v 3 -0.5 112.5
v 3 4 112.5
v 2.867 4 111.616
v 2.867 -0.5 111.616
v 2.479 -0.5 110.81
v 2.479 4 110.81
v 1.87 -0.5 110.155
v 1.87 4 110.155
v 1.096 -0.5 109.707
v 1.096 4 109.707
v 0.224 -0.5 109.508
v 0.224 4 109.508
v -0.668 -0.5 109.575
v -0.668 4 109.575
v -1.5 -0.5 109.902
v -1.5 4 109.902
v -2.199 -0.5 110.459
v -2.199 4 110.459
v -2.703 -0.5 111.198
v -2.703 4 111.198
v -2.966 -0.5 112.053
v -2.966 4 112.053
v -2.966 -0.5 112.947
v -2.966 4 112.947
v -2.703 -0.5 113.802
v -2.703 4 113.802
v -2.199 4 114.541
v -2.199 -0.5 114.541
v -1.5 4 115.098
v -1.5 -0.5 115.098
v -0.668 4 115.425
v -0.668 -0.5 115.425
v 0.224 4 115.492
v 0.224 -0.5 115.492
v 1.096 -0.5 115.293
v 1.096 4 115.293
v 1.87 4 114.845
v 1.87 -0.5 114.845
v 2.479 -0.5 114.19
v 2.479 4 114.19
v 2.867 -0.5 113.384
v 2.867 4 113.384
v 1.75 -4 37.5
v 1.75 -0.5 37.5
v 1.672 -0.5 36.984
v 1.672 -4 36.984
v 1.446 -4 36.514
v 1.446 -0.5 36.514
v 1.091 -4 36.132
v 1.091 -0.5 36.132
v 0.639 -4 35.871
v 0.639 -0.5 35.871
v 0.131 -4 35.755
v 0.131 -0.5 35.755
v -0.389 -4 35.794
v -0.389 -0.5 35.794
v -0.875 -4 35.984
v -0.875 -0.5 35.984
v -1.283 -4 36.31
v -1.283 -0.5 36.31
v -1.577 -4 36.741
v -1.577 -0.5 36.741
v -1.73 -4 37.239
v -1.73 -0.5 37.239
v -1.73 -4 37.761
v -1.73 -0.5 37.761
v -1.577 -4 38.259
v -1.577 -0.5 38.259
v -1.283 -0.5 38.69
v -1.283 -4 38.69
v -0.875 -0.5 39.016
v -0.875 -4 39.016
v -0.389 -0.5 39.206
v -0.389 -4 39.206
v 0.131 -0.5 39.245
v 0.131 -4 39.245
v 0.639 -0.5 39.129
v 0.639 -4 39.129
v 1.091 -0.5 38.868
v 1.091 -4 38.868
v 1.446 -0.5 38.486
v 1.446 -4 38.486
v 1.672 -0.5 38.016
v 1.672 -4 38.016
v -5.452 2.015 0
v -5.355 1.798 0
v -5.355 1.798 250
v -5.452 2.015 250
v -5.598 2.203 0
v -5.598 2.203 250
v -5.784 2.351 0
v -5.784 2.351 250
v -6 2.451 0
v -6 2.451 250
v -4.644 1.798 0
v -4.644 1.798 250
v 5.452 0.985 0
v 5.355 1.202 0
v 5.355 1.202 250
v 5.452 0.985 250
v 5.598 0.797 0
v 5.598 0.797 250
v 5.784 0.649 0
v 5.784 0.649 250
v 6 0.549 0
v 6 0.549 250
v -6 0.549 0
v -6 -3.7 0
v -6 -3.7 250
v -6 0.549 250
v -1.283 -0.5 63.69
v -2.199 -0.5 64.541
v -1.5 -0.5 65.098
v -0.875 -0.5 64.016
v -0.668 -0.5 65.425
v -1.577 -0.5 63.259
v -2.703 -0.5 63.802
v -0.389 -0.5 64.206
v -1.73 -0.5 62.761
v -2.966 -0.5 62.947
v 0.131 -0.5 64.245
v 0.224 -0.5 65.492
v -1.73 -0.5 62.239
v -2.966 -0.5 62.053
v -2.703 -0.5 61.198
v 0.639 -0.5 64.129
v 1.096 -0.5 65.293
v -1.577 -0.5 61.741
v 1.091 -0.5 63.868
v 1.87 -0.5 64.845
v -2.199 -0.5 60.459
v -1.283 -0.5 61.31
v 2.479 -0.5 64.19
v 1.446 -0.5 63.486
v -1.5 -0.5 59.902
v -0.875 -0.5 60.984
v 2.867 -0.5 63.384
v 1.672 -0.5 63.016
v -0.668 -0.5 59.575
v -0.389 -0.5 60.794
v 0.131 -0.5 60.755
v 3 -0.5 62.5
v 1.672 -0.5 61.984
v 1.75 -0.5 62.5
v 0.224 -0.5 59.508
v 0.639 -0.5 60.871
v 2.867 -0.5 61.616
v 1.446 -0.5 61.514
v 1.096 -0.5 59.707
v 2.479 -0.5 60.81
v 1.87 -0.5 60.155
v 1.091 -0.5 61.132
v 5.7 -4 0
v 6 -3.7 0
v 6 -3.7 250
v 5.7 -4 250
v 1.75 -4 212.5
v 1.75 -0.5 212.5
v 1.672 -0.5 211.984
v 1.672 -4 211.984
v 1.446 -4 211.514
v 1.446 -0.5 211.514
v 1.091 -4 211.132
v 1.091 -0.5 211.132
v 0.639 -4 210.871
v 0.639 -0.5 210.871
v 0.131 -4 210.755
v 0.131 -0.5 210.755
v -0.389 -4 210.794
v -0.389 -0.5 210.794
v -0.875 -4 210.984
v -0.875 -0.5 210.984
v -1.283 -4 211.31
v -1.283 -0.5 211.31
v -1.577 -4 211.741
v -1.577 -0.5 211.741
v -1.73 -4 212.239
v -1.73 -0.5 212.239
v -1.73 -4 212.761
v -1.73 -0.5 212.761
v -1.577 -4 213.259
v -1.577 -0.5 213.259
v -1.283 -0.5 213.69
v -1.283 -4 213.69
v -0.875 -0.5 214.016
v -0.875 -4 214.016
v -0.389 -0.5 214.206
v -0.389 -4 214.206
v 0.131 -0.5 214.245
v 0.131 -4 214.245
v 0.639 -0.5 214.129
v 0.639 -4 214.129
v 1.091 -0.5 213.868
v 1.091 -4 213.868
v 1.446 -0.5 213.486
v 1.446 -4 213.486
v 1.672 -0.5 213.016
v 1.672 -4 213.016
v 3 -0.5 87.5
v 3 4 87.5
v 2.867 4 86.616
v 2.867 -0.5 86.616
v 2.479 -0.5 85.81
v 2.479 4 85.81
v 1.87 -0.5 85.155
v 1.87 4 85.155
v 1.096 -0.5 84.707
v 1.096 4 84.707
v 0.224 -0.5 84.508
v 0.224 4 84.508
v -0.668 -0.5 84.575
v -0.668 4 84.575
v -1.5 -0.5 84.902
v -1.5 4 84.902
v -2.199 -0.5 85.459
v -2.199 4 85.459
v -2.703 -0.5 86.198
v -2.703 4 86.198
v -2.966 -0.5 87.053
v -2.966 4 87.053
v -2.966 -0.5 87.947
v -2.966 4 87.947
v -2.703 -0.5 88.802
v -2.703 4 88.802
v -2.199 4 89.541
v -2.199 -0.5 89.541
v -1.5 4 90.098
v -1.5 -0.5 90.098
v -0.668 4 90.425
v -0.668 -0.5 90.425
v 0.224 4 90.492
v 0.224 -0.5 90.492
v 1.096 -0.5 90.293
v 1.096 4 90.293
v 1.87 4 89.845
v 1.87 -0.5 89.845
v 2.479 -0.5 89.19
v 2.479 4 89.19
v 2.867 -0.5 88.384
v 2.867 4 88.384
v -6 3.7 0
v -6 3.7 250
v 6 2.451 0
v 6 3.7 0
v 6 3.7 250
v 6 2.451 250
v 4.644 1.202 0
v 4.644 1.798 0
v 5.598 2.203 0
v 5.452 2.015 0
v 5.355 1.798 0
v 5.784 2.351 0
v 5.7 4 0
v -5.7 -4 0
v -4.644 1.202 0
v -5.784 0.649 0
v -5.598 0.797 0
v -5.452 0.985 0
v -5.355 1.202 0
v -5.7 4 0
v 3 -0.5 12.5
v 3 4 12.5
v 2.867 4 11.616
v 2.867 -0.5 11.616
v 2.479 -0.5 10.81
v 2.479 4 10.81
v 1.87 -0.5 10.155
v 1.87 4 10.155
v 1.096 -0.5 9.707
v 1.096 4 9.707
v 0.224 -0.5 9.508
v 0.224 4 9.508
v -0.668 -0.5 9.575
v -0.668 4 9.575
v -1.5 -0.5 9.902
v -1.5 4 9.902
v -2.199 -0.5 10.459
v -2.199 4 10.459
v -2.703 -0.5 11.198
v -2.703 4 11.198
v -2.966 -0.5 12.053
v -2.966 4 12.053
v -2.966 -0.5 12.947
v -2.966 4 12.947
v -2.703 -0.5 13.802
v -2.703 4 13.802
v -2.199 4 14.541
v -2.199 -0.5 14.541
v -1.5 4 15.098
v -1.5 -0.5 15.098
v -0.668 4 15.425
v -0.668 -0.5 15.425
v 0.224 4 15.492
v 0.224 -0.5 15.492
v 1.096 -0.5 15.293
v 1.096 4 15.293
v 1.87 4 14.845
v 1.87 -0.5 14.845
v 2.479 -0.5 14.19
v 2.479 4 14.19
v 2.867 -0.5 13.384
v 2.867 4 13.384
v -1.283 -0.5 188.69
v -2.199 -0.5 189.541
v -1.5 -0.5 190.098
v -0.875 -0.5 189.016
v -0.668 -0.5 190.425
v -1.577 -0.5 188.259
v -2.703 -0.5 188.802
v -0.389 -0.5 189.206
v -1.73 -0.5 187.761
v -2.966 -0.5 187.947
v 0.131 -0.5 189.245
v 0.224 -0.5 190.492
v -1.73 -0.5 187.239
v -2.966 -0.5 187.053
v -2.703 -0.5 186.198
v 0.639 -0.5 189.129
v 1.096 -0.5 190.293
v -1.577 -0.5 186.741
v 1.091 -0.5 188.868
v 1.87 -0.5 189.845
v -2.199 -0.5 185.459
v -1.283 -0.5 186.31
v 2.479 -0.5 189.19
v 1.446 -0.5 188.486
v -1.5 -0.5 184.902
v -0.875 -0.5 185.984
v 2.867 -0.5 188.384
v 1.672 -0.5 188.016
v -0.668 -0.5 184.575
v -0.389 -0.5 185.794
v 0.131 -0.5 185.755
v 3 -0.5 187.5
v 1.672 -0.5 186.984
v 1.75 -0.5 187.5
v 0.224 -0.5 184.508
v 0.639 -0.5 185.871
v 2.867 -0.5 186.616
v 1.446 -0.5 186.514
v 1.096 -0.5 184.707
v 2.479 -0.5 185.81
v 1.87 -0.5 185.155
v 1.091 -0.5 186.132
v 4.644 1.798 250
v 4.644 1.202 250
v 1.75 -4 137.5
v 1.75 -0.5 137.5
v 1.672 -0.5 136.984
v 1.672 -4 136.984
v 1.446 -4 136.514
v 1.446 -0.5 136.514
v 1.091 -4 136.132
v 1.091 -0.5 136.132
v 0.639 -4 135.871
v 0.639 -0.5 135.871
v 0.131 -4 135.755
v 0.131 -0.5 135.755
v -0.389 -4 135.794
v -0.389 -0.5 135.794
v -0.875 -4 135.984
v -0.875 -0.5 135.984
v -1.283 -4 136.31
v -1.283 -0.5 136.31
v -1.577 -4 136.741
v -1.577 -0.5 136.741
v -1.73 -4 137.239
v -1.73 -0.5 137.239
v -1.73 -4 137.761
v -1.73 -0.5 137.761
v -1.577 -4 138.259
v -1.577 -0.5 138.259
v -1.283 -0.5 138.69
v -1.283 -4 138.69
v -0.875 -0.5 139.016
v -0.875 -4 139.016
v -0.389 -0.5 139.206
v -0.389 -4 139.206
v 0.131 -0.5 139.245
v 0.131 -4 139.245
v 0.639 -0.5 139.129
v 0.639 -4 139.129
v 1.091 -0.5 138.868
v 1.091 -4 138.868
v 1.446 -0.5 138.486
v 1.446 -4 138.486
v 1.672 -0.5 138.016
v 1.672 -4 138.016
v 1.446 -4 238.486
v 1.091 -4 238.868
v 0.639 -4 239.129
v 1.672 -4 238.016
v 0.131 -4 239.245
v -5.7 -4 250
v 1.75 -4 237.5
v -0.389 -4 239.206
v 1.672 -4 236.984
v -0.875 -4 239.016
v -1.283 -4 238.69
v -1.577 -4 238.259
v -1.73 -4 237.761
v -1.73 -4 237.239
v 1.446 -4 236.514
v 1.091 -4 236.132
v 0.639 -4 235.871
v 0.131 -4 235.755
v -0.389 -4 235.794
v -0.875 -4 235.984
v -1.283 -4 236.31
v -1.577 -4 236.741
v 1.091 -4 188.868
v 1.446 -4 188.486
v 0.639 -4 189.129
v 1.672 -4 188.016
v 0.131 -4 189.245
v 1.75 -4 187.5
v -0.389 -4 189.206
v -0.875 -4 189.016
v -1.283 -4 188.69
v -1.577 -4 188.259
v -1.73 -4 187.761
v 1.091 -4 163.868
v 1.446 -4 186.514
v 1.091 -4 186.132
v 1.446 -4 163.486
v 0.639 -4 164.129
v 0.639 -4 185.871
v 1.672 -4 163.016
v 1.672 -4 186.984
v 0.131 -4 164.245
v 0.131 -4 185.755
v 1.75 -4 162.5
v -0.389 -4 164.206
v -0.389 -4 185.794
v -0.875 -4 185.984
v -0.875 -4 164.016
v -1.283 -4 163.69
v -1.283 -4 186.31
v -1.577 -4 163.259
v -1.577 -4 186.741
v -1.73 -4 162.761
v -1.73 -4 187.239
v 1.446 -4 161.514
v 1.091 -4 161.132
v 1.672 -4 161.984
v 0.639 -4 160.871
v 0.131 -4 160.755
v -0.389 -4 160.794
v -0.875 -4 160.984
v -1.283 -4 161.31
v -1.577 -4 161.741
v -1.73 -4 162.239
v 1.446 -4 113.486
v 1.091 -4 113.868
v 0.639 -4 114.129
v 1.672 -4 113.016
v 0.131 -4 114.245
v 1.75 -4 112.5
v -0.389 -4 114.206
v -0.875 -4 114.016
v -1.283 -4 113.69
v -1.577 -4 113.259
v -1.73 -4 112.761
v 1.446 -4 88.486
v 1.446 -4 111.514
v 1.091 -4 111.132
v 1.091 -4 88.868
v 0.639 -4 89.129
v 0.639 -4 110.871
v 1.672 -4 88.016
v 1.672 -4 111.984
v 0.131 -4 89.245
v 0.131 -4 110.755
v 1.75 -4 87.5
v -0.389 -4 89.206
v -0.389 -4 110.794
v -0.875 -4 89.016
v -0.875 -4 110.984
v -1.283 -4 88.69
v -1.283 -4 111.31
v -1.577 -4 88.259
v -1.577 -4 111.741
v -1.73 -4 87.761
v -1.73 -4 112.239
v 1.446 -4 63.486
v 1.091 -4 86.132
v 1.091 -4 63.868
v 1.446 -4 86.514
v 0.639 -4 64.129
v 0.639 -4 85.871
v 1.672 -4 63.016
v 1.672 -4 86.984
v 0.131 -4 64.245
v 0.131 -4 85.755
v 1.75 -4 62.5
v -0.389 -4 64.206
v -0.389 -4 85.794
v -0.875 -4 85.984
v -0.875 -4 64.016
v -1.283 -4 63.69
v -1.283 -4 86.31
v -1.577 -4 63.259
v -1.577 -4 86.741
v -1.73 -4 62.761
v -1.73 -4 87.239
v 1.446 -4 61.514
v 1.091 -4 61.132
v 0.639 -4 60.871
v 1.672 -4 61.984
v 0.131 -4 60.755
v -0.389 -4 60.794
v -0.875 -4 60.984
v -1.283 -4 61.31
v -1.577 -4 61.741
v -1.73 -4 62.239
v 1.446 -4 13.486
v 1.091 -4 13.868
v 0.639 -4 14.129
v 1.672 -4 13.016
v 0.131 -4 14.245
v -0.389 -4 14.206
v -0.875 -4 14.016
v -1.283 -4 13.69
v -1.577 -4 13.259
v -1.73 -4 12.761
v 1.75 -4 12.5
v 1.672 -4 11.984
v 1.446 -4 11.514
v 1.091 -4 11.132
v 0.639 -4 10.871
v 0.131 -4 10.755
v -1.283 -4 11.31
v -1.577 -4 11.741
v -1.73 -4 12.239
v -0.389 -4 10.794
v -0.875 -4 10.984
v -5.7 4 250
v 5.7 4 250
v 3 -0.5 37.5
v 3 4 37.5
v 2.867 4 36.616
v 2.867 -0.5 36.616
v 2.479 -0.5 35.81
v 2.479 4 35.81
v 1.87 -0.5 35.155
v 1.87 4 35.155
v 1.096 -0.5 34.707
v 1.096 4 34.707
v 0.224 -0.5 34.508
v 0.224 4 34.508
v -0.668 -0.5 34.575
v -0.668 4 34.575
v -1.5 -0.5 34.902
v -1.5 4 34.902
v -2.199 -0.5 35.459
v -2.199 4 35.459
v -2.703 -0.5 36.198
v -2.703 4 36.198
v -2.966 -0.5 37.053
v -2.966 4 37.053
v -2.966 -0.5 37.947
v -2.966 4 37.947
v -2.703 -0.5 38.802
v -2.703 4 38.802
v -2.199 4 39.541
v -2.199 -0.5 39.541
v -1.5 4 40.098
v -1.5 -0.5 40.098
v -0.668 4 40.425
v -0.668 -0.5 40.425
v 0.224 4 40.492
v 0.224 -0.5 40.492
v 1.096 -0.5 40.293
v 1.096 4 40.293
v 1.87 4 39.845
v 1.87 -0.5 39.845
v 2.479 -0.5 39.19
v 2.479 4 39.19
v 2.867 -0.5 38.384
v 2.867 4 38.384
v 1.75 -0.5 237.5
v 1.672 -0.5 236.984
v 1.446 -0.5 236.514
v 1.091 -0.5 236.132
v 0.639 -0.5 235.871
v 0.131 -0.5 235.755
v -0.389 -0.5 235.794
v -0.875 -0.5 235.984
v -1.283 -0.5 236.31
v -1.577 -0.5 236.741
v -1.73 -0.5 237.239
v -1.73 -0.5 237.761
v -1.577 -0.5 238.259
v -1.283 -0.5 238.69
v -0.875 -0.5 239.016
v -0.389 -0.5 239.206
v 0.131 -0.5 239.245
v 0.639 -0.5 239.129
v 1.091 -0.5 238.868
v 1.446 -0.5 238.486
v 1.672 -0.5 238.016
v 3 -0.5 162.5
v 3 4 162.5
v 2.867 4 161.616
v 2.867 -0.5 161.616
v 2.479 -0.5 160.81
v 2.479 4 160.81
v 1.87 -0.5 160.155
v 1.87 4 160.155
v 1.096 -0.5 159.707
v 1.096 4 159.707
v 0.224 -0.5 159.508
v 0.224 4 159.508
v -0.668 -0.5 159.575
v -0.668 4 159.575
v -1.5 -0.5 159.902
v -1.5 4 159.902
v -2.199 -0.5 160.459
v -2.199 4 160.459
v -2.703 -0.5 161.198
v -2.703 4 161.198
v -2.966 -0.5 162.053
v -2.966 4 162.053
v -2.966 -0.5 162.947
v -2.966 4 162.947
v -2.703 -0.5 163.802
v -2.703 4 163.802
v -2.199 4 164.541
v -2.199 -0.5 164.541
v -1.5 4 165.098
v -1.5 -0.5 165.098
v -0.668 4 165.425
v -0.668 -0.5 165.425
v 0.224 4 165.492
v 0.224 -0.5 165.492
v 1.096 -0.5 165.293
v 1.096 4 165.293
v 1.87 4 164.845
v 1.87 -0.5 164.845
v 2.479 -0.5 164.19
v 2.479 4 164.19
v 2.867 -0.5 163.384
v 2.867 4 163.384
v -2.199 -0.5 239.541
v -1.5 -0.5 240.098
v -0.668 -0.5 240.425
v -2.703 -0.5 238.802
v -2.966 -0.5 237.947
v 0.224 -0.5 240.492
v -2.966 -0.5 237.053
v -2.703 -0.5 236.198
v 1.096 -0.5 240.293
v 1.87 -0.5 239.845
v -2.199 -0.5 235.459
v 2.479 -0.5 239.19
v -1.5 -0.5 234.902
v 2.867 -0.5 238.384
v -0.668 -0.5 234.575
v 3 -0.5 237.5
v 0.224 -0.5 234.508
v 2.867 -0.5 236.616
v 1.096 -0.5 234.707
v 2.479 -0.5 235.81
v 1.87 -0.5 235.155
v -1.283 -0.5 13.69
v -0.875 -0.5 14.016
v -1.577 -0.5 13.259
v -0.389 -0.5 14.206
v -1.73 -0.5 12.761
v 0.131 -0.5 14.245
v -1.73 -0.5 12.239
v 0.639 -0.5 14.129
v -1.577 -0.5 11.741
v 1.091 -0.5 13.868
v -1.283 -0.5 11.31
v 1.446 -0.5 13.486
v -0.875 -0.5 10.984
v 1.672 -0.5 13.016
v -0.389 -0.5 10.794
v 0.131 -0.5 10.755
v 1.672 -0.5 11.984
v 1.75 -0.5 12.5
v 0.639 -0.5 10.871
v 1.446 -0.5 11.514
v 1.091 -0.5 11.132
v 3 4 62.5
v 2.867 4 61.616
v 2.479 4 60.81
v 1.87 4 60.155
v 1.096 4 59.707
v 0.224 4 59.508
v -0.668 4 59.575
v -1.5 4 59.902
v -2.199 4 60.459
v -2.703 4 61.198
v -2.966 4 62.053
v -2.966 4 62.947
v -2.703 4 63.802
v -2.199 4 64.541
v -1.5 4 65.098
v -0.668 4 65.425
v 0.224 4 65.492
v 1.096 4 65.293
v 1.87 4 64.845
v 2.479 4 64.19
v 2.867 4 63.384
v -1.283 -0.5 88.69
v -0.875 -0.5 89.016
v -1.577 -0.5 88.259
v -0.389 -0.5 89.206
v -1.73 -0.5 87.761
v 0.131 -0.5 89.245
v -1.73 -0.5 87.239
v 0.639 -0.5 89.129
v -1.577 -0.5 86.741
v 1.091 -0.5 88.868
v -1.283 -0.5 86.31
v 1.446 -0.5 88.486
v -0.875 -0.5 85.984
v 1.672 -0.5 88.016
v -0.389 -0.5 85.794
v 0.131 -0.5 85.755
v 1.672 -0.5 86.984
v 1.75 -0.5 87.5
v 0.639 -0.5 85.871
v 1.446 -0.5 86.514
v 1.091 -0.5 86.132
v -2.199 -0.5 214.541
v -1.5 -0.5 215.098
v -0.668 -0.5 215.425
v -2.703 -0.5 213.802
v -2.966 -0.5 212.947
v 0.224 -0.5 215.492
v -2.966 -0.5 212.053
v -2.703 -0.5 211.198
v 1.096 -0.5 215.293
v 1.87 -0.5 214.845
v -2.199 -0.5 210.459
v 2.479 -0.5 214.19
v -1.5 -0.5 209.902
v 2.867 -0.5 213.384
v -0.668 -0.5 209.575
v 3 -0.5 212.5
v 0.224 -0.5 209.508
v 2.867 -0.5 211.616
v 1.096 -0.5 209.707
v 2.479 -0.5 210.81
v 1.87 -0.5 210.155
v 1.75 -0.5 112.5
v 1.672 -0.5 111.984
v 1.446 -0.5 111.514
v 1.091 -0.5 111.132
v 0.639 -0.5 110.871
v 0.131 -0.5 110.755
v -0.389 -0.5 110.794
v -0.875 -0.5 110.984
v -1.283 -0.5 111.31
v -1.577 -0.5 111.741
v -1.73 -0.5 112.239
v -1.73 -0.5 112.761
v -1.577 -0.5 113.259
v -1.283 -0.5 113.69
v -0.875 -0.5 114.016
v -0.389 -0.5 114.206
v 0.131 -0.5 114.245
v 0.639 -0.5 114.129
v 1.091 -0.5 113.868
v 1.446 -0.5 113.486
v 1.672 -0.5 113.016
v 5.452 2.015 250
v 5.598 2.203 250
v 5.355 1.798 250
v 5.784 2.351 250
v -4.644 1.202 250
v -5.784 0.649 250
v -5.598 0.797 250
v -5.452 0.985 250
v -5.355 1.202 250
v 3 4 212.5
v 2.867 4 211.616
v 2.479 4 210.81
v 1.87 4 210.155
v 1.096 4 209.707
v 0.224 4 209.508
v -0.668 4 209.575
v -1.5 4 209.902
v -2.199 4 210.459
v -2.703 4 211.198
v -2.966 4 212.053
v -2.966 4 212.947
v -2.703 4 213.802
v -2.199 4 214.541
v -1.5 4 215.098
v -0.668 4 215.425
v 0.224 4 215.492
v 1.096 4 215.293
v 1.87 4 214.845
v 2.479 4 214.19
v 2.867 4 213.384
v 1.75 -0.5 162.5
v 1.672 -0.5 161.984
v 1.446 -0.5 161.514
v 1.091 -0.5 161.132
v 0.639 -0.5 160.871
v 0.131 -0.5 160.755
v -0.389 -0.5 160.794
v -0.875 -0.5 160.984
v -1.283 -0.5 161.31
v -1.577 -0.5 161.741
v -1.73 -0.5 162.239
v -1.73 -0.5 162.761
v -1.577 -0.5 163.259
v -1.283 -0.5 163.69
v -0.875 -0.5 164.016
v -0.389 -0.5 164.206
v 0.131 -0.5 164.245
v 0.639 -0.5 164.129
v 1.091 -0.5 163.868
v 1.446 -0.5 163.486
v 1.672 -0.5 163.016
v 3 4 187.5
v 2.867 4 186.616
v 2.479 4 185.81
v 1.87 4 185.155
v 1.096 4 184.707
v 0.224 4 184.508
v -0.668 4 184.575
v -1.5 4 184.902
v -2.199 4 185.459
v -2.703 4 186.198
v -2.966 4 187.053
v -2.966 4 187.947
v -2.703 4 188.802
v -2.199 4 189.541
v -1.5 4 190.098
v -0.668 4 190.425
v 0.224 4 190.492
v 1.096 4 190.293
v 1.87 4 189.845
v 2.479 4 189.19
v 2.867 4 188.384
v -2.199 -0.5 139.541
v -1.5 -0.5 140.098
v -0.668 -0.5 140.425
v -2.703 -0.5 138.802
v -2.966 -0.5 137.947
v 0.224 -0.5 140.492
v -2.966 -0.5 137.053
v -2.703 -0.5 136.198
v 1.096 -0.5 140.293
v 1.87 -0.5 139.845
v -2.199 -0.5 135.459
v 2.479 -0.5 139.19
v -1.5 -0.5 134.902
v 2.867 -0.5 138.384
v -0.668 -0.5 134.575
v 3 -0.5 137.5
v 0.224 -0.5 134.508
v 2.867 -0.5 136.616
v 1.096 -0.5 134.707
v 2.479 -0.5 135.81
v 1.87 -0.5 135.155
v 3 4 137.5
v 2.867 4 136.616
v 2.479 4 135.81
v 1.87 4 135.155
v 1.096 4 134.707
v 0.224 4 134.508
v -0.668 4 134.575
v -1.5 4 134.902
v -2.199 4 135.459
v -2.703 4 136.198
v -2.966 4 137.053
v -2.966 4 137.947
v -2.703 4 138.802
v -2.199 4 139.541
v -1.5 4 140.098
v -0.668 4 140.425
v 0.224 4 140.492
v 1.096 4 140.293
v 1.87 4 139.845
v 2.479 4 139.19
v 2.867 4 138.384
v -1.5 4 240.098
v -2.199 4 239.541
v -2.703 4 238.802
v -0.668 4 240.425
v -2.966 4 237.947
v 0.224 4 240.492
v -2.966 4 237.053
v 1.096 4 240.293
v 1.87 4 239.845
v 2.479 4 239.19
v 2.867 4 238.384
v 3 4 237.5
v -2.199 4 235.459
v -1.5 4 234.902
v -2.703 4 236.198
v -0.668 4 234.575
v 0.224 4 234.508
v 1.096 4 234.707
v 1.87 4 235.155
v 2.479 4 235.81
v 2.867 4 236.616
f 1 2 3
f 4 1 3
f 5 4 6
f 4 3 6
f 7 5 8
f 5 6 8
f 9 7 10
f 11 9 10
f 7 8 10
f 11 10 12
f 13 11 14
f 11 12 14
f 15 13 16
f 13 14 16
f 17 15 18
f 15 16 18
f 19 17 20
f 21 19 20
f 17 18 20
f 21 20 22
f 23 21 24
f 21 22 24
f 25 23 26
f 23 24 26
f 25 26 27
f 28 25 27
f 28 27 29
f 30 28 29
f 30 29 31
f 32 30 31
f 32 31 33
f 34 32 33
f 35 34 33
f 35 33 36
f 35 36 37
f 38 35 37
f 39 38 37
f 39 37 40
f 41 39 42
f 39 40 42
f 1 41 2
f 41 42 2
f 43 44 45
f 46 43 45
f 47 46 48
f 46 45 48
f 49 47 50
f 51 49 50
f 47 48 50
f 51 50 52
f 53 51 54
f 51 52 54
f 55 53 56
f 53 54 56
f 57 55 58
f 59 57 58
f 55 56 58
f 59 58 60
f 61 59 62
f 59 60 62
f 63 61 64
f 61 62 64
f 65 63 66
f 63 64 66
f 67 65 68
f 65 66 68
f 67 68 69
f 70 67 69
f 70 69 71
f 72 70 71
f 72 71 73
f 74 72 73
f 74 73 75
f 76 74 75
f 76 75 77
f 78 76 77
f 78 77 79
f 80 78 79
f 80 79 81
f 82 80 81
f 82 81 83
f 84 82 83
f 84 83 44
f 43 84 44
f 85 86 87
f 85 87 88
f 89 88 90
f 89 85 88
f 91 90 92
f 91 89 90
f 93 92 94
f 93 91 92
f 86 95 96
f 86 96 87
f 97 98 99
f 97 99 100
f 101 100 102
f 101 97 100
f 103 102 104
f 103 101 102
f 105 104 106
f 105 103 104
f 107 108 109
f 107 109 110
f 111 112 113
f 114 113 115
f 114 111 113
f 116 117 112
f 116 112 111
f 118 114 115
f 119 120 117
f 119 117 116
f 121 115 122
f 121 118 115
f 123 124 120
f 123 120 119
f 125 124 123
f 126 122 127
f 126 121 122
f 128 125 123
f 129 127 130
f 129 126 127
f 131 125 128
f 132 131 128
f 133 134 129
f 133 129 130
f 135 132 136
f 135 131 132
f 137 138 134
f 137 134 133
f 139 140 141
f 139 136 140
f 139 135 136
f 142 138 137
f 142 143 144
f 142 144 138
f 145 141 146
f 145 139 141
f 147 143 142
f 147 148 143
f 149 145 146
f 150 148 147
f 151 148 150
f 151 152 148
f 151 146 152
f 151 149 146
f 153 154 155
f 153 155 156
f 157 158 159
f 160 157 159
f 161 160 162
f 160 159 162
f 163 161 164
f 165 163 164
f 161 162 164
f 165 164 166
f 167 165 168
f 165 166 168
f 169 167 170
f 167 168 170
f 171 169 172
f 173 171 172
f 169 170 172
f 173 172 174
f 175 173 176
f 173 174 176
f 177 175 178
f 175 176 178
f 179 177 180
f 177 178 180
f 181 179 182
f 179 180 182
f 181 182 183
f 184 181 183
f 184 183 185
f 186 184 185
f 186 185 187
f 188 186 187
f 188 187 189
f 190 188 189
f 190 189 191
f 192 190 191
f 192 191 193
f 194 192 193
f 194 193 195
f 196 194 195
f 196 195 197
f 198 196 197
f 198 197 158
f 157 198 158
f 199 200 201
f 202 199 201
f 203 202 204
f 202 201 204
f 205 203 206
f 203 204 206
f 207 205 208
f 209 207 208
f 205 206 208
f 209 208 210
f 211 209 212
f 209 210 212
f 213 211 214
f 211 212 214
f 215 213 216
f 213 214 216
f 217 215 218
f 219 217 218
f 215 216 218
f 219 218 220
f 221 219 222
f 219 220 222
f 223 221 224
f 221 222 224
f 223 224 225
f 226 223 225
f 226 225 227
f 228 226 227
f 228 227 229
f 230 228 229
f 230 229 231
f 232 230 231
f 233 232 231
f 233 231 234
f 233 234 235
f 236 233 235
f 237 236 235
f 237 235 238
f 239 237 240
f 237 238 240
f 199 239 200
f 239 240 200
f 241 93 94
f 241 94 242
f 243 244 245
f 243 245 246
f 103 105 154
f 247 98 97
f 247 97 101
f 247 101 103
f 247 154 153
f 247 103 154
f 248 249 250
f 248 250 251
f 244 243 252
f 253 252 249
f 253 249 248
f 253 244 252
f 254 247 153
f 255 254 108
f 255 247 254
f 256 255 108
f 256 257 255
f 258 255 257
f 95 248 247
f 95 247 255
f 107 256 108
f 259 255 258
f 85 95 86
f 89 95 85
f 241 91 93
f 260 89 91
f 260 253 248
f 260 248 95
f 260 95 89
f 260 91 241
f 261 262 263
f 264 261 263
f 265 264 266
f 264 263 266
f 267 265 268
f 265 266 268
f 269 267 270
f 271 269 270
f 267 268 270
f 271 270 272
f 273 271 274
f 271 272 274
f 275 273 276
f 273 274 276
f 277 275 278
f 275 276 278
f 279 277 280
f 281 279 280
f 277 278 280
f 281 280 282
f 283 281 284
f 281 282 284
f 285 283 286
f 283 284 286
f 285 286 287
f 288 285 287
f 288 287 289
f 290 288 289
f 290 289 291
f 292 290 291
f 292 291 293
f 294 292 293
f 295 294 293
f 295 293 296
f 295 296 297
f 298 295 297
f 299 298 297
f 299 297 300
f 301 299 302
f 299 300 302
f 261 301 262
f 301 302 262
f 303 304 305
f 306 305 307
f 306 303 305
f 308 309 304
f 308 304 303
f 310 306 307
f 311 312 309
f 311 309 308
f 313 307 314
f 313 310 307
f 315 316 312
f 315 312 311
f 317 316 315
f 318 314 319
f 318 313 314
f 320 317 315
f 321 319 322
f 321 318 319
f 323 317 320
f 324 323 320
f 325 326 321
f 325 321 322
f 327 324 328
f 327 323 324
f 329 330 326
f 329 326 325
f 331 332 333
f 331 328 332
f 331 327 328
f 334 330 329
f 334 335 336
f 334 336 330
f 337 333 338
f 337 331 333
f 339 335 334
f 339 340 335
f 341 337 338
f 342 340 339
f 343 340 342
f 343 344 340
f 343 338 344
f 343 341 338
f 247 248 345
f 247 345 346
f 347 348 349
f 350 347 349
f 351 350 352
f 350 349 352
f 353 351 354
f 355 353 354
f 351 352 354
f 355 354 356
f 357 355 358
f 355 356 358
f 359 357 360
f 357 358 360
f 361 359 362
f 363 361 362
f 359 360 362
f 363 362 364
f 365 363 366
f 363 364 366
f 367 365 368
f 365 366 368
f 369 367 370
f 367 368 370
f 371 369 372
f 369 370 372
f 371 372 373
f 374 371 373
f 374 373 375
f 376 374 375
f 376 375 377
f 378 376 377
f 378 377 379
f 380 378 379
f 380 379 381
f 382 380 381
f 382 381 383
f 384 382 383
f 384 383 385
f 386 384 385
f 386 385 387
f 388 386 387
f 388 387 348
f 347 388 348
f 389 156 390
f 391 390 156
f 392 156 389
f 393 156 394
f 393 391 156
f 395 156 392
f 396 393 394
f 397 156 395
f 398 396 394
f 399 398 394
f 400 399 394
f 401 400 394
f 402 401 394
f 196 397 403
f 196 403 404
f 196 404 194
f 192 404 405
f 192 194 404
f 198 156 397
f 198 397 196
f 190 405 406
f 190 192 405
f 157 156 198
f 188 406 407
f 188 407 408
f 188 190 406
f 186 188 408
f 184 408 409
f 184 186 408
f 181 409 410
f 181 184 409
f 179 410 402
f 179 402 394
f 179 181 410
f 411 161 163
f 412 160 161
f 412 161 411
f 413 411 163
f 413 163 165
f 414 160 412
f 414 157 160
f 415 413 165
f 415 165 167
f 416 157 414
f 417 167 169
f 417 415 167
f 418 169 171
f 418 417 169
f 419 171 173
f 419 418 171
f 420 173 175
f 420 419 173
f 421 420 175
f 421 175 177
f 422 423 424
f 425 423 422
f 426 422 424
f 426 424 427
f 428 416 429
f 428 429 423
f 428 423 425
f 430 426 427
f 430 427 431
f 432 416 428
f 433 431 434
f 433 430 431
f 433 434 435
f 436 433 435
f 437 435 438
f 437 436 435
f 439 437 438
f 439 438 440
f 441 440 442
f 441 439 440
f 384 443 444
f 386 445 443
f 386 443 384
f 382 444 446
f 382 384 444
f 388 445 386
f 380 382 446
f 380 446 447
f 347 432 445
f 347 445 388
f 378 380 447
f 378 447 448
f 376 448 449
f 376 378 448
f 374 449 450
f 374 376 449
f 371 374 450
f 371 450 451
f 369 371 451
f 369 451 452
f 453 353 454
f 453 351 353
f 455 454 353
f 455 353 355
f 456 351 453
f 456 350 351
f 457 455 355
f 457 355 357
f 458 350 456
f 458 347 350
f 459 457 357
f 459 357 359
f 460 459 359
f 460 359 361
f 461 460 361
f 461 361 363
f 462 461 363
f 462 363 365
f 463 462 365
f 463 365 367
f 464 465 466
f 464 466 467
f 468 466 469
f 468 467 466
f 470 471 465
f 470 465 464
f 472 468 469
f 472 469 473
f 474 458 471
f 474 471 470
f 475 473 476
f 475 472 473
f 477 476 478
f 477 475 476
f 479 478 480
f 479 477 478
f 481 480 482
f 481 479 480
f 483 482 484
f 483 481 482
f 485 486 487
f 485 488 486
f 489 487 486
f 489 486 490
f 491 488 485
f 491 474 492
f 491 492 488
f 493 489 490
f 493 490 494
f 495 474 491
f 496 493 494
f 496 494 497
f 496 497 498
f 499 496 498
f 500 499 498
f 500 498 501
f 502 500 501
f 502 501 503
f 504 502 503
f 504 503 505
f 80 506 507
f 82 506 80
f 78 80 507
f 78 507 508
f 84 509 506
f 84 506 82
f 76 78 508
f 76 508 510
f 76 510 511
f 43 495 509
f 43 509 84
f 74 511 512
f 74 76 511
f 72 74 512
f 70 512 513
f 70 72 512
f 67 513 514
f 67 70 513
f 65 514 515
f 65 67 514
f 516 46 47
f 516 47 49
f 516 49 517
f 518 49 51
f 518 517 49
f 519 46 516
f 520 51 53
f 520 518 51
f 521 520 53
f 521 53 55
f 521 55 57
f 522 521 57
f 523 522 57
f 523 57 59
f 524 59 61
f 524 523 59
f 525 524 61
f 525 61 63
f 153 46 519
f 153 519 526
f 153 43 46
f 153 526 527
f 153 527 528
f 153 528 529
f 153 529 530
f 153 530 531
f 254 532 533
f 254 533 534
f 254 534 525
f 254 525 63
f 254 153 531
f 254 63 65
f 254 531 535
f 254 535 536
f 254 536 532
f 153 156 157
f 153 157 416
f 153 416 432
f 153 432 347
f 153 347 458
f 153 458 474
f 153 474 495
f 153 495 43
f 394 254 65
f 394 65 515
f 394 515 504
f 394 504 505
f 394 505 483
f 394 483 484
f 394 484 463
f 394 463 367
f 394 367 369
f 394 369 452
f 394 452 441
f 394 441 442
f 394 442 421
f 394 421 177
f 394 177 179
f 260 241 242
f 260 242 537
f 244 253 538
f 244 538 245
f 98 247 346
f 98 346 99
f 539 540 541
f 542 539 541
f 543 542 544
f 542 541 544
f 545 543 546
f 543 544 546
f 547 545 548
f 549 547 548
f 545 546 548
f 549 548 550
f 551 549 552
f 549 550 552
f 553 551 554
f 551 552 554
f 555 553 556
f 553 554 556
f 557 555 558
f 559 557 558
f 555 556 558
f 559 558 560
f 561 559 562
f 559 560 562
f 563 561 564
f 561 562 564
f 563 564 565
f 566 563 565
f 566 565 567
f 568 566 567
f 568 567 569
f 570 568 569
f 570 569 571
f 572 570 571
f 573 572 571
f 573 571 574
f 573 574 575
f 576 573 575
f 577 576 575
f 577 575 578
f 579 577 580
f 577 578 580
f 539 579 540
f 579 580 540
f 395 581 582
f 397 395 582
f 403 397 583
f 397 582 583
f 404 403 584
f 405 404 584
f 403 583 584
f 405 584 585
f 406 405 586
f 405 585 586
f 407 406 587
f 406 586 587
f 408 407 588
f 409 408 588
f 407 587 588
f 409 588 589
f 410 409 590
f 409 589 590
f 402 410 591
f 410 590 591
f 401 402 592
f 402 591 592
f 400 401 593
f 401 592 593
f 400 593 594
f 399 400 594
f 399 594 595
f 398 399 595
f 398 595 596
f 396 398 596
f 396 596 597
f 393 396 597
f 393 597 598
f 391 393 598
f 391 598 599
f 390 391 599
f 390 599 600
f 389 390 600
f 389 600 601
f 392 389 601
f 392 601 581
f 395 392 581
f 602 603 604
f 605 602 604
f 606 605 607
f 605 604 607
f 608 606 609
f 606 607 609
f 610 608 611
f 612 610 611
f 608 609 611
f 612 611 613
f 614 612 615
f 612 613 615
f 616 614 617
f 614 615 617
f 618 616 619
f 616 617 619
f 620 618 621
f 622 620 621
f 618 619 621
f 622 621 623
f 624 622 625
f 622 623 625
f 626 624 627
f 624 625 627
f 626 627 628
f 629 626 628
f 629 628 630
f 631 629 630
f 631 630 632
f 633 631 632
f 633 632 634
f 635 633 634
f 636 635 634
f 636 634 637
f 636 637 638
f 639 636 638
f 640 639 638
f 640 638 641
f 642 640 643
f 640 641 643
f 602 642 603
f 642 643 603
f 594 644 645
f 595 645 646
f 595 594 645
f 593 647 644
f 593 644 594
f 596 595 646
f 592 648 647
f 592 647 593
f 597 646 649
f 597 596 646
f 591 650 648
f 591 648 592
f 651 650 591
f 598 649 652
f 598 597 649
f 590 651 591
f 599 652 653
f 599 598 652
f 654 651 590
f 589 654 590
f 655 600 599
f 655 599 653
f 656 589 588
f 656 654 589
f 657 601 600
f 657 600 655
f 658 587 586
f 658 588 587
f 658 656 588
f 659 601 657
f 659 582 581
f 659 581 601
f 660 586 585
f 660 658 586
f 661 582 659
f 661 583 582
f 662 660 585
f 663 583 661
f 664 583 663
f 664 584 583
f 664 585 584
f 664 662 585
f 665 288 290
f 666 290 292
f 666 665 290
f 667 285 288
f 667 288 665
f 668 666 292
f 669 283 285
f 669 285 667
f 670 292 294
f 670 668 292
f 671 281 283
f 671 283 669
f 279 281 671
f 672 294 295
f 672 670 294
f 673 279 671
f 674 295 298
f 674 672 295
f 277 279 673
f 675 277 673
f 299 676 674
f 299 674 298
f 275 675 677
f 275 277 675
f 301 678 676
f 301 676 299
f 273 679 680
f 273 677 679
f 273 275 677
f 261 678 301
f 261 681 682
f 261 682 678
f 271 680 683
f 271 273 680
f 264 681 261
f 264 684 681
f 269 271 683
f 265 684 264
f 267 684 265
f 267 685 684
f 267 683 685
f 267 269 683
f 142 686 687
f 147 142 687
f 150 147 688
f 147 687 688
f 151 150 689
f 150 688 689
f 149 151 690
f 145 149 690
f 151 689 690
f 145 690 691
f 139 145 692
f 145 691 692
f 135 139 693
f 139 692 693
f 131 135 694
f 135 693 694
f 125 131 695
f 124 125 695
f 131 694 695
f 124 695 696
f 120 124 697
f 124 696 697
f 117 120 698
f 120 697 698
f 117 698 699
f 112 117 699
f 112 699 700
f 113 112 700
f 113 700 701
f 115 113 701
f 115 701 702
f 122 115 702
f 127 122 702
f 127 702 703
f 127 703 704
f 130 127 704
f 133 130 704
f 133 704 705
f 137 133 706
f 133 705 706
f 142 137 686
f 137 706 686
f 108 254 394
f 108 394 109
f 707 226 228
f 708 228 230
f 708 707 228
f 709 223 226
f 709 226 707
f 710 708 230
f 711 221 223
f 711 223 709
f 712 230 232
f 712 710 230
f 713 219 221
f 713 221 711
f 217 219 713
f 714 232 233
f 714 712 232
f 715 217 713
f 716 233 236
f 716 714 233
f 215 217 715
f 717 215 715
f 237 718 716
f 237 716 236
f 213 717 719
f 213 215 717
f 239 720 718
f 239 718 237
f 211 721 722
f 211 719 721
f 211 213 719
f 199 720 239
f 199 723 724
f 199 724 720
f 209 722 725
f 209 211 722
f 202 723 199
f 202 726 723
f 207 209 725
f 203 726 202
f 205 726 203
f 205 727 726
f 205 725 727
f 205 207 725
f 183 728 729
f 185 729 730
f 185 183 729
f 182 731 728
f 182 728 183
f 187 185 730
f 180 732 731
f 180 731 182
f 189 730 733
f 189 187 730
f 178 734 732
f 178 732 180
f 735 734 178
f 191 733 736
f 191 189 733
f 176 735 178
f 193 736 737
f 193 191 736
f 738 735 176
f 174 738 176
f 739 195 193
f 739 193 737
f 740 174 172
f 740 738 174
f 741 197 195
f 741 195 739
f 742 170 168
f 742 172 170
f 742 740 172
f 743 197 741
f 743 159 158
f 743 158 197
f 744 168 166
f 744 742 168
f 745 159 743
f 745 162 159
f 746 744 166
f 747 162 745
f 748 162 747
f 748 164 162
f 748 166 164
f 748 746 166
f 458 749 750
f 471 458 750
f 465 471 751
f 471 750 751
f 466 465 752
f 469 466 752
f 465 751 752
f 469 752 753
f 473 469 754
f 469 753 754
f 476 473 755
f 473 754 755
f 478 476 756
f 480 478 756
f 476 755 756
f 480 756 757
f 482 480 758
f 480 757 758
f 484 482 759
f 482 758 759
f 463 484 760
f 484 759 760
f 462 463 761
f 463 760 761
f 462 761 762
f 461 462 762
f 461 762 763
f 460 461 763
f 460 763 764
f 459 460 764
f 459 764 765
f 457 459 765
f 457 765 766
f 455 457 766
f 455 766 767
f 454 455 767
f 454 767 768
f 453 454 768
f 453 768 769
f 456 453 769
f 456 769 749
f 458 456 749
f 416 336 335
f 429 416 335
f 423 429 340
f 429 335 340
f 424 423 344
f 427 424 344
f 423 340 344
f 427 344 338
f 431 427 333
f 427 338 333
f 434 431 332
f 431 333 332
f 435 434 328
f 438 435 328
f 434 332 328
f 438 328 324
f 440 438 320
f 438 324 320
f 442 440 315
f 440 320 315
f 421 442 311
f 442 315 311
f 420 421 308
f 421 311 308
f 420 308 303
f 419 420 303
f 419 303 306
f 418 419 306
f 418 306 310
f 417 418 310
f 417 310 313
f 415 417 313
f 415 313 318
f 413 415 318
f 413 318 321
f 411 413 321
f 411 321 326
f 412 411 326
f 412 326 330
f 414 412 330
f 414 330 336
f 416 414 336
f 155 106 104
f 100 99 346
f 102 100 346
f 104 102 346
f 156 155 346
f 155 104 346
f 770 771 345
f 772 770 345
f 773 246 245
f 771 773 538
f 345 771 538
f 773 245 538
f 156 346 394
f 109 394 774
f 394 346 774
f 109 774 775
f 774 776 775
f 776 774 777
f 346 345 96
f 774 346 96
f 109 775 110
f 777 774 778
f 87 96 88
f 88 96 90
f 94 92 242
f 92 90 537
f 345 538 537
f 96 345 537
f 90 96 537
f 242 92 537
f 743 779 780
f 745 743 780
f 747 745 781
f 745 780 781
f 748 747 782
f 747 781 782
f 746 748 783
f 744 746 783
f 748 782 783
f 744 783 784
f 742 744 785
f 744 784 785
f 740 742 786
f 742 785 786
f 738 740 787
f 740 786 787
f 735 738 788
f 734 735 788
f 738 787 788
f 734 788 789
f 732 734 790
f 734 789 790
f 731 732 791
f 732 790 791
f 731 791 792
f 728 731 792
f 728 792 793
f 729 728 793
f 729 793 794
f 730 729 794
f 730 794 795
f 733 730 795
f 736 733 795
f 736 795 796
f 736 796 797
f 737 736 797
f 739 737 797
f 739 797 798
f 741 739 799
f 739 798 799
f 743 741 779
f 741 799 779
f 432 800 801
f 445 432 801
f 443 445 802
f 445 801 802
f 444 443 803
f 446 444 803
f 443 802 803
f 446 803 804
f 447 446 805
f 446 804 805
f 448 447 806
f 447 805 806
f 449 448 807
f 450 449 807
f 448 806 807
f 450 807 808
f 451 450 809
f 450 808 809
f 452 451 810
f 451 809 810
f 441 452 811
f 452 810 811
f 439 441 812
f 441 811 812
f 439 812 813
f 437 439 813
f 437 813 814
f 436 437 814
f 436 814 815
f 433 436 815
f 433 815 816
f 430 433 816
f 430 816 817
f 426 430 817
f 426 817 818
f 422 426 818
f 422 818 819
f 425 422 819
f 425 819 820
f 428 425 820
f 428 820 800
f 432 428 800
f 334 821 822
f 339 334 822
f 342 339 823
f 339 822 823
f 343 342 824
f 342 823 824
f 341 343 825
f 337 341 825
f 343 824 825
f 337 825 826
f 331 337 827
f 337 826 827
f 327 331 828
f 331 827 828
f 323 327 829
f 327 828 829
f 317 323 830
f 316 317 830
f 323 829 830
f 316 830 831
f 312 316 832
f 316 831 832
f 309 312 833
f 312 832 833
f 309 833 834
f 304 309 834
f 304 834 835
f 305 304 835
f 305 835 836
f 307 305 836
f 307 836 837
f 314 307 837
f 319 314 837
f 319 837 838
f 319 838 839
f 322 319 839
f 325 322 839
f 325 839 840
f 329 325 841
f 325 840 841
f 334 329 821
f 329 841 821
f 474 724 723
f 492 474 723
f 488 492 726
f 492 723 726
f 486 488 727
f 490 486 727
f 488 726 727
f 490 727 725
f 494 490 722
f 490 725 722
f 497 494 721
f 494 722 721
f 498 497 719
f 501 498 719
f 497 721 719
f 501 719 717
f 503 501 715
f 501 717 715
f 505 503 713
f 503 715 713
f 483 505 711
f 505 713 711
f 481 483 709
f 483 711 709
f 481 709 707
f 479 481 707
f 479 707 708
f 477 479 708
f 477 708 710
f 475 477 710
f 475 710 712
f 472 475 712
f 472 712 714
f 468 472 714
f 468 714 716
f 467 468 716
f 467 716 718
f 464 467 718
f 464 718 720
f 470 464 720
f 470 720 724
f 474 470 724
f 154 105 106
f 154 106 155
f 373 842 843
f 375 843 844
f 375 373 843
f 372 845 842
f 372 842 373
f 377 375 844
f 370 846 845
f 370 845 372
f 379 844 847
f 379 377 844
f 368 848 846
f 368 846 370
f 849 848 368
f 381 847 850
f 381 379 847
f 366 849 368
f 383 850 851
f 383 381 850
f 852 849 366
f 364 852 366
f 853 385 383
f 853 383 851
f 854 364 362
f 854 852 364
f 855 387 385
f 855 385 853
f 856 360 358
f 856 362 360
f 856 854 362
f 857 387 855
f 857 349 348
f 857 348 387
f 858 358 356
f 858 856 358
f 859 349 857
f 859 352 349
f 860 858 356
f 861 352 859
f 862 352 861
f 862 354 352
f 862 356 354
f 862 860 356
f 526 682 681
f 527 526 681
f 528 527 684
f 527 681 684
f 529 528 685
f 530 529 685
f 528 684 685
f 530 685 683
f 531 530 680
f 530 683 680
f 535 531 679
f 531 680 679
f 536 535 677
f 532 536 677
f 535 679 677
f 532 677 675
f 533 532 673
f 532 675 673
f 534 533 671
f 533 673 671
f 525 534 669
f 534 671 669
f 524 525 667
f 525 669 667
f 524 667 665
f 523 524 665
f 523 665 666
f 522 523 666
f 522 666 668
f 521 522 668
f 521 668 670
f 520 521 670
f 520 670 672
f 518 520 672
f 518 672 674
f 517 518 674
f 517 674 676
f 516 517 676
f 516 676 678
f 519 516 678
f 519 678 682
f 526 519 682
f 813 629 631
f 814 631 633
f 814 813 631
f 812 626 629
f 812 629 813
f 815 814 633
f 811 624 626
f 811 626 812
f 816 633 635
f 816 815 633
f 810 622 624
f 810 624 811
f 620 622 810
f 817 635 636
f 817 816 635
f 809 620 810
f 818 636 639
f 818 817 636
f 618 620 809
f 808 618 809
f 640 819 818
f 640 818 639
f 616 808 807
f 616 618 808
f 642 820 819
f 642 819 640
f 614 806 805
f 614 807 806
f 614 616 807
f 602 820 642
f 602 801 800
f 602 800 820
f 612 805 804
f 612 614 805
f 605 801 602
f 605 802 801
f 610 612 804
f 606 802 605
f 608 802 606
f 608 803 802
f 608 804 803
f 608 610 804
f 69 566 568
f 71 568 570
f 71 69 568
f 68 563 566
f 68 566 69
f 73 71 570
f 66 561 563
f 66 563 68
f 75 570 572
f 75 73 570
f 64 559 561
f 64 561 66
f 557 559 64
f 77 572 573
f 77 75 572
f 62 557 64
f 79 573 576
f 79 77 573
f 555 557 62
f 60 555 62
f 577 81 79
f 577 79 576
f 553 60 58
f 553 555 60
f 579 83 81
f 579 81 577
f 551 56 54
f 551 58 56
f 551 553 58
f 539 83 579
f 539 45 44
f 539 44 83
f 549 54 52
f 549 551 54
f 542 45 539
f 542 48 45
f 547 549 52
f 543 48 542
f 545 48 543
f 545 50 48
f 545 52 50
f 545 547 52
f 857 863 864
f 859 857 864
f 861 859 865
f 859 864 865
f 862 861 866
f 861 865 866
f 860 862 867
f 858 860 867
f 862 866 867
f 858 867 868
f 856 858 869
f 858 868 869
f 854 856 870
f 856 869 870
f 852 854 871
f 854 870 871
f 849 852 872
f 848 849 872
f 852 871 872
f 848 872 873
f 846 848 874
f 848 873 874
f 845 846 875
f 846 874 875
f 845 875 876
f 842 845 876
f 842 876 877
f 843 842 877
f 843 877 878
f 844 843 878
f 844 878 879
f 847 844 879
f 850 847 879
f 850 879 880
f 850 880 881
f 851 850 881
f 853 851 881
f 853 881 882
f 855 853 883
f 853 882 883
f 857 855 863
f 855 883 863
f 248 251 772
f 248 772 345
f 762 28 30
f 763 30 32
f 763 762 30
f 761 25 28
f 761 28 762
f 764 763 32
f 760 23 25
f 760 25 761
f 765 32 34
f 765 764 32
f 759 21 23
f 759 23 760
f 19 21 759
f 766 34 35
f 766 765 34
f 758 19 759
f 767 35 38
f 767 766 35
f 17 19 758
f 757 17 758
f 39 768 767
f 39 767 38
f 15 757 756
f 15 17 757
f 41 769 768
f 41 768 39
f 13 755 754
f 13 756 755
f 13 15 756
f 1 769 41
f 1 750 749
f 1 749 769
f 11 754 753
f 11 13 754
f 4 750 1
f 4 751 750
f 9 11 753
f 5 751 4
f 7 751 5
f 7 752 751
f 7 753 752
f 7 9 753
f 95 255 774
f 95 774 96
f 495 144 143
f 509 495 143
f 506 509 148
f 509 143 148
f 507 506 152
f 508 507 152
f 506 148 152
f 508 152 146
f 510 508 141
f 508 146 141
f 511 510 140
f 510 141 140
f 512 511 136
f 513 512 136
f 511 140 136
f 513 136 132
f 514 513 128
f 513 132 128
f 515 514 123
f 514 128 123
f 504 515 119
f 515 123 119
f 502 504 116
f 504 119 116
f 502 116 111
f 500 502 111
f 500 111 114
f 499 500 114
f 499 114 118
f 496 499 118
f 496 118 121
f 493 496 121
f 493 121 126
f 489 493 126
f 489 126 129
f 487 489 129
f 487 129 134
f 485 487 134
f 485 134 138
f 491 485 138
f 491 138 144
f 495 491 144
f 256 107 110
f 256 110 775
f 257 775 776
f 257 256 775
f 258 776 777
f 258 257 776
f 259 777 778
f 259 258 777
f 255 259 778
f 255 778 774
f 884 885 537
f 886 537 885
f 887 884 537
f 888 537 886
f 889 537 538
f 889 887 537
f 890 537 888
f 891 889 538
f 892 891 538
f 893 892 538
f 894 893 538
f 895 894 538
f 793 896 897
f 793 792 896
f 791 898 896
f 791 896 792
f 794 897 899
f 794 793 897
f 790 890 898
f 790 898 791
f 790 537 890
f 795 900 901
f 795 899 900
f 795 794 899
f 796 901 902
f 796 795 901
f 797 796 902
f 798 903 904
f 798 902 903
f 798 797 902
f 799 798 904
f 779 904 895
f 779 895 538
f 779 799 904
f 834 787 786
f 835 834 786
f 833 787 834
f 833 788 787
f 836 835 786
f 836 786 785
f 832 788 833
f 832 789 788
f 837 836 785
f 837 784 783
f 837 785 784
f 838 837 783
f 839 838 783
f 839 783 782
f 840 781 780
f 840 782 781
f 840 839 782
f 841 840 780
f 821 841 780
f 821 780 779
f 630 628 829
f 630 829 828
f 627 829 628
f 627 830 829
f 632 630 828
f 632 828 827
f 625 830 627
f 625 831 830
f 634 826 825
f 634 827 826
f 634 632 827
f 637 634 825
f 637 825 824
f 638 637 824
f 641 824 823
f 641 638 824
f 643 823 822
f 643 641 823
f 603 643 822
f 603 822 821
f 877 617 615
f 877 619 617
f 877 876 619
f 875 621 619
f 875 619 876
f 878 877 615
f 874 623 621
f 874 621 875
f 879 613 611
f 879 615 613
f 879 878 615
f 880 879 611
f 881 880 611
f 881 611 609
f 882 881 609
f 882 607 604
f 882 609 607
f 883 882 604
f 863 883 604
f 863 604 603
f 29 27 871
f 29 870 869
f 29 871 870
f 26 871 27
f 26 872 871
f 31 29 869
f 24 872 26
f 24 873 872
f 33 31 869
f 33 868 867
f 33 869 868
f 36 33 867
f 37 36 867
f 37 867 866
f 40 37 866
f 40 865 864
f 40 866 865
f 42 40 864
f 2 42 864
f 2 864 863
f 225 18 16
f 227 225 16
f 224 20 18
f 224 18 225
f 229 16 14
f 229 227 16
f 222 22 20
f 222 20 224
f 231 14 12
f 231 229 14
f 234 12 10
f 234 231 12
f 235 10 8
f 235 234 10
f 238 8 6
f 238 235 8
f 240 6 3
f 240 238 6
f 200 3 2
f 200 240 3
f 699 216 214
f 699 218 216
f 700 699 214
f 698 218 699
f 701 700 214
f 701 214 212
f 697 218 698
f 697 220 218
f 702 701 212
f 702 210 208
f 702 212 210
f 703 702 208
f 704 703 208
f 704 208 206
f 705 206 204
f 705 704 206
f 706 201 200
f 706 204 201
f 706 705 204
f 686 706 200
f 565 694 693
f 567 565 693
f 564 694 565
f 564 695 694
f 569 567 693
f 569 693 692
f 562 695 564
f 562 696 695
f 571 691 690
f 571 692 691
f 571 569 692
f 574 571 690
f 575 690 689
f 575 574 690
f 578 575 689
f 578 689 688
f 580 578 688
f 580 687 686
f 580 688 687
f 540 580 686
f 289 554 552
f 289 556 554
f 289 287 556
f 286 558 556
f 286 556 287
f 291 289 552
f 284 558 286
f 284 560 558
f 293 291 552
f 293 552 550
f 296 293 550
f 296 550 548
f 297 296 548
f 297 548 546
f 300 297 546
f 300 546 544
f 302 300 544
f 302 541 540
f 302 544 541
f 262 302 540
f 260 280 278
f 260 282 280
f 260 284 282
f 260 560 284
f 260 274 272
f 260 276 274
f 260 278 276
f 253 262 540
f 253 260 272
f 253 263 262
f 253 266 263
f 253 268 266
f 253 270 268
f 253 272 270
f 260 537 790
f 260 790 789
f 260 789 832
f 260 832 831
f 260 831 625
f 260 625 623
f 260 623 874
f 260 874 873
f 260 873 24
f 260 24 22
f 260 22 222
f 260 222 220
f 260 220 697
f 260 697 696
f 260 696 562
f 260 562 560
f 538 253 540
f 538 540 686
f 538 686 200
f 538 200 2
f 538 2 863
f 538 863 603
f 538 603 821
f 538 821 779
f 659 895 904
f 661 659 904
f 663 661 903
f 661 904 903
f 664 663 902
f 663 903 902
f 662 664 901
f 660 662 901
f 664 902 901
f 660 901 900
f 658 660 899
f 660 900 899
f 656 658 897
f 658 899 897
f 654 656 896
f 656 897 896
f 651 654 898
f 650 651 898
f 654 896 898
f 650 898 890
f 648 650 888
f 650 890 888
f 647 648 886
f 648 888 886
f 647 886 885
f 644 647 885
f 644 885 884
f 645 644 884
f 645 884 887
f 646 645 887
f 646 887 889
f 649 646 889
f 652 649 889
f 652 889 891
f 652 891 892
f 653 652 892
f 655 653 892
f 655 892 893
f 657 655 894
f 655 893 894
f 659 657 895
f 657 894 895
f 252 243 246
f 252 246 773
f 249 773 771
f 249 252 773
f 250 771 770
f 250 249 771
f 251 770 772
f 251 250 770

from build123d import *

# Parameters (mm, degrees)
EXTRUDE_1_DEPTH        = 250
SKETCH_2_R             = 3
SKETCH_2_R_2           = 1.75
CUT_EXTRUDE_1_DEPTH    = 4.5
SKETCH_2_2_R           = 1.75
CUT_EXTRUDE_2_DEPTH    = 9
PATTERN_LINEAR_1_COUNT = 10
PATTERN_LINEAR_1_PITCH = 25


with BuildPart() as part:
    # Эскиз1 → Бобышка-Вытянуть1 (new body)
    with BuildSketch(Plane.XY):
        with BuildLine():
            Line((-6, 3.7), (-5.7, 4))
            Line((-5.7, 4), (5.7, 4))
            Line((5.7, 4), (6, 3.7))
            Line((6, 3.7), (6, 2.451013544))
            ThreePointArc((6, 2.451013544), (5.597935912, 2.202976267), (5.354599002, 1.798050138))
            Line((5.354599002, 1.798050138), (4.643514056, 1.798050138))
            Line((4.643514056, 1.798050138), (4.643514056, 1.201949862))
            Line((4.643514056, 1.201949862), (5.354599002, 1.201949862))
            ThreePointArc((5.354599002, 1.201949862), (5.597935912, 0.797023733), (6, 0.548986456))
            Line((6, 0.548986456), (6, -3.7))
            Line((6, -3.7), (5.7, -4))
            Line((5.7, -4), (-5.7, -4))
            Line((-5.7, -4), (-6, -3.7))
            Line((-6, -3.7), (-6, 0.548986456))
            ThreePointArc((-6, 0.548986456), (-5.597935912, 0.797023733), (-5.354599002, 1.201949862))
            Line((-5.354599002, 1.201949862), (-4.643514056, 1.201949862))
            Line((-4.643514056, 1.201949862), (-4.643514056, 1.798050138))
            Line((-4.643514056, 1.798050138), (-5.354599002, 1.798050138))
            ThreePointArc((-5.354599002, 1.798050138), (-5.597935912, 2.202976267), (-6, 2.451013544))
            Line((-6, 2.451013544), (-6, 3.7))
        make_face()
    extrude(amount=EXTRUDE_1_DEPTH)

    # Эскиз2 → Вырез-Вытянуть1 (cut)
    with BuildSketch(Plane(origin=(0, 4, 0), x_dir=(1, 0, 0), z_dir=(0, 1, 0))):
        with Locations((0, -12.5)):
            Circle(SKETCH_2_R)
        with Locations((0, -12.5)):
            Circle(SKETCH_2_R_2, mode=Mode.SUBTRACT)
    cut_extrude_1 = extrude(amount=-CUT_EXTRUDE_1_DEPTH, mode=Mode.SUBTRACT)

    # Эскиз2<2> → Вырез-Вытянуть2 (cut, through all)
    with BuildSketch(Plane(origin=(0, 4, 0), x_dir=(1, 0, 0), z_dir=(0, 1, 0))):
        with Locations((0, -12.5)):
            Circle(SKETCH_2_2_R)
    cut_extrude_2 = extrude(amount=-CUT_EXTRUDE_2_DEPTH, mode=Mode.SUBTRACT)

    # Линейный массив1: Вырез-Вытянуть1, Вырез-Вытянуть2 ×10
    with Locations(*[(0, 0, i * PATTERN_LINEAR_1_PITCH) for i in range(1, PATTERN_LINEAR_1_COUNT)]):
        add(cut_extrude_1, mode=Mode.SUBTRACT)
        add(cut_extrude_2, mode=Mode.SUBTRACT)


solid = part.part
